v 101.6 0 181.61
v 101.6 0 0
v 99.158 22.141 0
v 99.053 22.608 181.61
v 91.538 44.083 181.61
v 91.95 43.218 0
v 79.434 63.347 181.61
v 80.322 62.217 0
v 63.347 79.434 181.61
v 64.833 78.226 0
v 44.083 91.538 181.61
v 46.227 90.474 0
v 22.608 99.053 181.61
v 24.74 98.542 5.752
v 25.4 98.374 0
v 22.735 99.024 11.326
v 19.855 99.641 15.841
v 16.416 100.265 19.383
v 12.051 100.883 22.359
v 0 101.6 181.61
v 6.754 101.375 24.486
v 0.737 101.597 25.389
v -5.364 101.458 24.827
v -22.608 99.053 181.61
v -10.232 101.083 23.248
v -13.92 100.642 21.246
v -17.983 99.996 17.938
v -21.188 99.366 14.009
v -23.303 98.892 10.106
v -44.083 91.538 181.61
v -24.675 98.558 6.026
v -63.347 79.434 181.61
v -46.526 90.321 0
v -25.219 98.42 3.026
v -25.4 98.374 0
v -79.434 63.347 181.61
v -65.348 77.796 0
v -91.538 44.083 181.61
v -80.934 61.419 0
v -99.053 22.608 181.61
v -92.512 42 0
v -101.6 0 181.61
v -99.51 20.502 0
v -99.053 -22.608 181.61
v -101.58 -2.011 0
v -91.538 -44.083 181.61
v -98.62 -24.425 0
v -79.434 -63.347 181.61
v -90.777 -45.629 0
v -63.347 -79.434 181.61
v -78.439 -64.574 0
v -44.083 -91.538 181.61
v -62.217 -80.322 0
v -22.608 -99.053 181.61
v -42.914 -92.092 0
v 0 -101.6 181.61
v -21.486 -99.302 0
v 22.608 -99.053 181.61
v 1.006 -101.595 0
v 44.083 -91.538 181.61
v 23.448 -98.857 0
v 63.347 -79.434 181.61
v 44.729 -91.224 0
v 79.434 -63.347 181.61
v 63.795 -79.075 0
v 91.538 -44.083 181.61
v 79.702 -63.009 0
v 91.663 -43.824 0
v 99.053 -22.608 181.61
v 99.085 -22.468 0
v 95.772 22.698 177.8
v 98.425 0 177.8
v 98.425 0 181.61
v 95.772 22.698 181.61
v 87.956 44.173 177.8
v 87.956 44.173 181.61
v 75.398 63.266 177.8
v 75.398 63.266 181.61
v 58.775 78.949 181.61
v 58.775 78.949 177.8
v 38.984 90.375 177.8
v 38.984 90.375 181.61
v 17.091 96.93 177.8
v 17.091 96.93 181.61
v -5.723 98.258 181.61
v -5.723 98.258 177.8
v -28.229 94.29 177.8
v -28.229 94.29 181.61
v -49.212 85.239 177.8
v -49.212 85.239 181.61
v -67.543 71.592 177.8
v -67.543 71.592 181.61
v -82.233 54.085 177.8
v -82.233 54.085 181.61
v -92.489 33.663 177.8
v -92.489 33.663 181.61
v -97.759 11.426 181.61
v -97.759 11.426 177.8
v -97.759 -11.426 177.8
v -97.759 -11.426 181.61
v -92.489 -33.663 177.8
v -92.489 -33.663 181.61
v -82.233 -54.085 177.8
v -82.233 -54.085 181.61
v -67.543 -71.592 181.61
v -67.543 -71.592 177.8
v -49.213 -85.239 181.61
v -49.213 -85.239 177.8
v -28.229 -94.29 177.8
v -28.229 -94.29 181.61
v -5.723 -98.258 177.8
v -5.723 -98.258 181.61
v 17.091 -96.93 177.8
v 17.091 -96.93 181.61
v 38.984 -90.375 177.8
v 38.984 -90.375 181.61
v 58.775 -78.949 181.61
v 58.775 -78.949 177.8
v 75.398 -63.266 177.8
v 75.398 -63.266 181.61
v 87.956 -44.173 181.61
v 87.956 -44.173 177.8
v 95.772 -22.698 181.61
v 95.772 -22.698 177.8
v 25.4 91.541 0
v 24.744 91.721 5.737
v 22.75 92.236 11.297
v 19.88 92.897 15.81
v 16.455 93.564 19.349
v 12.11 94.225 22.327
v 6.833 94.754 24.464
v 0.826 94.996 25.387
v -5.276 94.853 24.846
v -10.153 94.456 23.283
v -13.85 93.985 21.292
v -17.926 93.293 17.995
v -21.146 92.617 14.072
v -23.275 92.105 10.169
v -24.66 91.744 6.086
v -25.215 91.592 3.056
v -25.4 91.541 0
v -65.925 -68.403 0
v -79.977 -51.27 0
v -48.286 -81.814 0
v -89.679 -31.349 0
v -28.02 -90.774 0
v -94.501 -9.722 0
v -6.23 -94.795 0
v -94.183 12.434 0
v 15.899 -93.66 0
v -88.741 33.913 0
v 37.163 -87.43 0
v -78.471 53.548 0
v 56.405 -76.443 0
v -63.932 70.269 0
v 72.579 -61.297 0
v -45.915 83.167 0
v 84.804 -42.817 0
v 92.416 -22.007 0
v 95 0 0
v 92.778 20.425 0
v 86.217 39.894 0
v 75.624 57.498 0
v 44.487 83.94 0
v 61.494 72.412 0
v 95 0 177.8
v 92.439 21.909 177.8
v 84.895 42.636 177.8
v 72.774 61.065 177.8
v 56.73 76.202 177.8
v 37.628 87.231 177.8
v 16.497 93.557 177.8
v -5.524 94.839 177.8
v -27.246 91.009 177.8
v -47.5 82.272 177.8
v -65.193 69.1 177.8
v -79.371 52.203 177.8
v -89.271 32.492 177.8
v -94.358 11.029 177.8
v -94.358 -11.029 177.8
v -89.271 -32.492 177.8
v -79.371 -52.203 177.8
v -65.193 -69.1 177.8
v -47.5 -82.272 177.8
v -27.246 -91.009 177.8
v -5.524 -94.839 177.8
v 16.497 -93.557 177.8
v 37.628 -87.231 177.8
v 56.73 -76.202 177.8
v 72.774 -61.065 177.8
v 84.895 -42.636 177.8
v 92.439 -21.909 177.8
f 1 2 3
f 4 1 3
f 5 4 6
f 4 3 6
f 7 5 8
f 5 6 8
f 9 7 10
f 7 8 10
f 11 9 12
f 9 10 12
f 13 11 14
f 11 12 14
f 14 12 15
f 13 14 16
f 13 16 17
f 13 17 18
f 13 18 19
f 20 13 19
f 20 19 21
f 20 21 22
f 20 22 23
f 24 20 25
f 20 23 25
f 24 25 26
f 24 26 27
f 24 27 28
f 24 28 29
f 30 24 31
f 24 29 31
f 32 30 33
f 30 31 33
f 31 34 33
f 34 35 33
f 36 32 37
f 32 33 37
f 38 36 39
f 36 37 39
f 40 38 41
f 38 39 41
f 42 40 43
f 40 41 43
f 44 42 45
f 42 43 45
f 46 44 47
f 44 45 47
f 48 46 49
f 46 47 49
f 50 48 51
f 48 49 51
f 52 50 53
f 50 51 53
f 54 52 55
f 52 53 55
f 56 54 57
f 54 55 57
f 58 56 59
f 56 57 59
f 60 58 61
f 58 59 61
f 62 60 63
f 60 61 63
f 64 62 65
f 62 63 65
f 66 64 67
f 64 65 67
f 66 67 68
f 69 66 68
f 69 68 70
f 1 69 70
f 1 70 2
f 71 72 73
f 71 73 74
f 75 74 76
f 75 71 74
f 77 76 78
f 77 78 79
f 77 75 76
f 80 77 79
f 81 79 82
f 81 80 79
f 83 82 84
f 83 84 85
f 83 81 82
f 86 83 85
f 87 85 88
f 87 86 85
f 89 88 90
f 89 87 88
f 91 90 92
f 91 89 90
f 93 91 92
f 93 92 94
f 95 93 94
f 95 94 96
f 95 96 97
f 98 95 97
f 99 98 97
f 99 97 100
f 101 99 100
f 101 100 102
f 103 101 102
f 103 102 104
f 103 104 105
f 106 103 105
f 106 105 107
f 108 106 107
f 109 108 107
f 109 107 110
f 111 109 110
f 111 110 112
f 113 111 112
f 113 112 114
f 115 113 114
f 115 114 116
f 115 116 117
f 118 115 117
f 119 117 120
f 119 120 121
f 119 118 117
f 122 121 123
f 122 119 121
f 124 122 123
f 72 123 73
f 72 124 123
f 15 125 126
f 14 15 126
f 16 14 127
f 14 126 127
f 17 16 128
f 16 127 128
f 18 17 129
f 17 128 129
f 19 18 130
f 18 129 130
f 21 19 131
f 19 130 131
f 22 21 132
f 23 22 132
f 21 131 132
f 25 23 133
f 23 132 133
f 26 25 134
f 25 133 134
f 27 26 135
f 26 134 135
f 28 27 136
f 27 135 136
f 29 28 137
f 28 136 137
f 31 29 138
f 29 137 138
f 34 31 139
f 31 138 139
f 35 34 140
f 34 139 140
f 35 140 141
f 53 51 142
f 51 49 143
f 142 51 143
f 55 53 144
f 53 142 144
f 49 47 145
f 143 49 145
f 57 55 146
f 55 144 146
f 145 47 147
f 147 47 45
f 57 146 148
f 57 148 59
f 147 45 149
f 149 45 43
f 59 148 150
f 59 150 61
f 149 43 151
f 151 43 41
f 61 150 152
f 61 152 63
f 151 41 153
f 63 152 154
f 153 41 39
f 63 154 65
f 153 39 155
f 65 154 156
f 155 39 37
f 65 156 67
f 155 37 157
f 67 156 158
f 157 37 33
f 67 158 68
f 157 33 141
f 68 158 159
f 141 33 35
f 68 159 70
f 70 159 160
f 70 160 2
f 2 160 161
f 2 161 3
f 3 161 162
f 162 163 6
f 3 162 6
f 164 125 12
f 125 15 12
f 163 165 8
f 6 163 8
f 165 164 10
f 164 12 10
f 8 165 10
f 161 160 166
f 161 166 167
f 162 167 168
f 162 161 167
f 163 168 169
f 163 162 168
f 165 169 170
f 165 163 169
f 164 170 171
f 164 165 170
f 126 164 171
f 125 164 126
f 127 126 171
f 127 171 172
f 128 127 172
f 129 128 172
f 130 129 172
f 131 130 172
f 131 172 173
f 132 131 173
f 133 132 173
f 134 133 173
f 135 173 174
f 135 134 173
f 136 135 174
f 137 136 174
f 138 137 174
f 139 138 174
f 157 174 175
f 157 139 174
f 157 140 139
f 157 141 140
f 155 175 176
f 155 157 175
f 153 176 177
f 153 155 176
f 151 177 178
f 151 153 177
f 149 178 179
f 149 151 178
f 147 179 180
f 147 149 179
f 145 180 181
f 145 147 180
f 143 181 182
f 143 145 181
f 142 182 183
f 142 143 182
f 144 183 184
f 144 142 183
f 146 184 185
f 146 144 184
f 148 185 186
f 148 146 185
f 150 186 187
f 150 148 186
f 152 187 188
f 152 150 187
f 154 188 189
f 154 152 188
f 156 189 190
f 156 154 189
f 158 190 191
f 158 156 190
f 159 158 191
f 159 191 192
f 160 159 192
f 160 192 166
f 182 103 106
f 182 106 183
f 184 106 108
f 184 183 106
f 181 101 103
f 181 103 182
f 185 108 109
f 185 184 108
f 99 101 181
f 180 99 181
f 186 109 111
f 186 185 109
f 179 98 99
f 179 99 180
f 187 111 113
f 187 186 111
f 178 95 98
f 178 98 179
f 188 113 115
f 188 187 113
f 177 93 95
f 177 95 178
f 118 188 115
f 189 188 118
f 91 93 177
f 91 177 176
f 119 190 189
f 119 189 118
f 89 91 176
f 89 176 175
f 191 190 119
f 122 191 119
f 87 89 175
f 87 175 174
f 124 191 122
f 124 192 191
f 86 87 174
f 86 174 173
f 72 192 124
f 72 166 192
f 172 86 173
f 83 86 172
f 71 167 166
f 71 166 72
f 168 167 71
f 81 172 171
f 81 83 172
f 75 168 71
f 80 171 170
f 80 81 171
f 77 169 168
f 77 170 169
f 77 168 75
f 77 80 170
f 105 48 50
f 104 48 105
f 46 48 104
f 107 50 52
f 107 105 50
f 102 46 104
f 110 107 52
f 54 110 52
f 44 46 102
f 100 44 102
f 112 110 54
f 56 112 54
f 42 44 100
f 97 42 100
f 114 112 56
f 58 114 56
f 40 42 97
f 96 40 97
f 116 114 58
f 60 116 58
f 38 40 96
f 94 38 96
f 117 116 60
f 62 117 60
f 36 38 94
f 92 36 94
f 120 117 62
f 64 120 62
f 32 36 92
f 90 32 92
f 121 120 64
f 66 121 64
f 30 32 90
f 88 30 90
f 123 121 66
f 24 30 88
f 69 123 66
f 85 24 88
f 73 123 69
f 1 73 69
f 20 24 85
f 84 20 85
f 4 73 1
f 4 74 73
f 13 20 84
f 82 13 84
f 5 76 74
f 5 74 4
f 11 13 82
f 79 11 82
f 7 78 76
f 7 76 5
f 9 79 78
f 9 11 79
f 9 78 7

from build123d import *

# Parameters (mm, degrees)
F0_R     = 101.6
F0_R_2   = 98.425
F1_DEPTH = 181.61
F0_R_3   = 95
F2_DEPTH = 177.8
F4_DEPTH = 101.601


with BuildPart() as f1:
    # F0 (on Top) → F1 (new body)
    with BuildSketch(Plane.XY):
        Circle(F0_R)
        Circle(F0_R_2, mode=Mode.SUBTRACT)
    extrude(amount=F1_DEPTH)

    # F0 (on Top) → F2 (join)
    with BuildSketch(Plane.XY):
        Circle(F0_R_2)
        Circle(F0_R_3, mode=Mode.SUBTRACT)
    extrude(amount=F2_DEPTH)

    # F3 (on Front) → F4 (cut, through all)
    with BuildSketch(Plane.XZ):
        with BuildLine():
            ThreePointArc((0, -25.4), (17.9605122421, -17.9605122421), (25.4, 0))
            ThreePointArc((25.4, 0), (-17.9605122421, 17.9605122421), (0, -25.4))
        make_face()
    extrude(amount=-F4_DEPTH, mode=Mode.SUBTRACT)


solid = f1.part
